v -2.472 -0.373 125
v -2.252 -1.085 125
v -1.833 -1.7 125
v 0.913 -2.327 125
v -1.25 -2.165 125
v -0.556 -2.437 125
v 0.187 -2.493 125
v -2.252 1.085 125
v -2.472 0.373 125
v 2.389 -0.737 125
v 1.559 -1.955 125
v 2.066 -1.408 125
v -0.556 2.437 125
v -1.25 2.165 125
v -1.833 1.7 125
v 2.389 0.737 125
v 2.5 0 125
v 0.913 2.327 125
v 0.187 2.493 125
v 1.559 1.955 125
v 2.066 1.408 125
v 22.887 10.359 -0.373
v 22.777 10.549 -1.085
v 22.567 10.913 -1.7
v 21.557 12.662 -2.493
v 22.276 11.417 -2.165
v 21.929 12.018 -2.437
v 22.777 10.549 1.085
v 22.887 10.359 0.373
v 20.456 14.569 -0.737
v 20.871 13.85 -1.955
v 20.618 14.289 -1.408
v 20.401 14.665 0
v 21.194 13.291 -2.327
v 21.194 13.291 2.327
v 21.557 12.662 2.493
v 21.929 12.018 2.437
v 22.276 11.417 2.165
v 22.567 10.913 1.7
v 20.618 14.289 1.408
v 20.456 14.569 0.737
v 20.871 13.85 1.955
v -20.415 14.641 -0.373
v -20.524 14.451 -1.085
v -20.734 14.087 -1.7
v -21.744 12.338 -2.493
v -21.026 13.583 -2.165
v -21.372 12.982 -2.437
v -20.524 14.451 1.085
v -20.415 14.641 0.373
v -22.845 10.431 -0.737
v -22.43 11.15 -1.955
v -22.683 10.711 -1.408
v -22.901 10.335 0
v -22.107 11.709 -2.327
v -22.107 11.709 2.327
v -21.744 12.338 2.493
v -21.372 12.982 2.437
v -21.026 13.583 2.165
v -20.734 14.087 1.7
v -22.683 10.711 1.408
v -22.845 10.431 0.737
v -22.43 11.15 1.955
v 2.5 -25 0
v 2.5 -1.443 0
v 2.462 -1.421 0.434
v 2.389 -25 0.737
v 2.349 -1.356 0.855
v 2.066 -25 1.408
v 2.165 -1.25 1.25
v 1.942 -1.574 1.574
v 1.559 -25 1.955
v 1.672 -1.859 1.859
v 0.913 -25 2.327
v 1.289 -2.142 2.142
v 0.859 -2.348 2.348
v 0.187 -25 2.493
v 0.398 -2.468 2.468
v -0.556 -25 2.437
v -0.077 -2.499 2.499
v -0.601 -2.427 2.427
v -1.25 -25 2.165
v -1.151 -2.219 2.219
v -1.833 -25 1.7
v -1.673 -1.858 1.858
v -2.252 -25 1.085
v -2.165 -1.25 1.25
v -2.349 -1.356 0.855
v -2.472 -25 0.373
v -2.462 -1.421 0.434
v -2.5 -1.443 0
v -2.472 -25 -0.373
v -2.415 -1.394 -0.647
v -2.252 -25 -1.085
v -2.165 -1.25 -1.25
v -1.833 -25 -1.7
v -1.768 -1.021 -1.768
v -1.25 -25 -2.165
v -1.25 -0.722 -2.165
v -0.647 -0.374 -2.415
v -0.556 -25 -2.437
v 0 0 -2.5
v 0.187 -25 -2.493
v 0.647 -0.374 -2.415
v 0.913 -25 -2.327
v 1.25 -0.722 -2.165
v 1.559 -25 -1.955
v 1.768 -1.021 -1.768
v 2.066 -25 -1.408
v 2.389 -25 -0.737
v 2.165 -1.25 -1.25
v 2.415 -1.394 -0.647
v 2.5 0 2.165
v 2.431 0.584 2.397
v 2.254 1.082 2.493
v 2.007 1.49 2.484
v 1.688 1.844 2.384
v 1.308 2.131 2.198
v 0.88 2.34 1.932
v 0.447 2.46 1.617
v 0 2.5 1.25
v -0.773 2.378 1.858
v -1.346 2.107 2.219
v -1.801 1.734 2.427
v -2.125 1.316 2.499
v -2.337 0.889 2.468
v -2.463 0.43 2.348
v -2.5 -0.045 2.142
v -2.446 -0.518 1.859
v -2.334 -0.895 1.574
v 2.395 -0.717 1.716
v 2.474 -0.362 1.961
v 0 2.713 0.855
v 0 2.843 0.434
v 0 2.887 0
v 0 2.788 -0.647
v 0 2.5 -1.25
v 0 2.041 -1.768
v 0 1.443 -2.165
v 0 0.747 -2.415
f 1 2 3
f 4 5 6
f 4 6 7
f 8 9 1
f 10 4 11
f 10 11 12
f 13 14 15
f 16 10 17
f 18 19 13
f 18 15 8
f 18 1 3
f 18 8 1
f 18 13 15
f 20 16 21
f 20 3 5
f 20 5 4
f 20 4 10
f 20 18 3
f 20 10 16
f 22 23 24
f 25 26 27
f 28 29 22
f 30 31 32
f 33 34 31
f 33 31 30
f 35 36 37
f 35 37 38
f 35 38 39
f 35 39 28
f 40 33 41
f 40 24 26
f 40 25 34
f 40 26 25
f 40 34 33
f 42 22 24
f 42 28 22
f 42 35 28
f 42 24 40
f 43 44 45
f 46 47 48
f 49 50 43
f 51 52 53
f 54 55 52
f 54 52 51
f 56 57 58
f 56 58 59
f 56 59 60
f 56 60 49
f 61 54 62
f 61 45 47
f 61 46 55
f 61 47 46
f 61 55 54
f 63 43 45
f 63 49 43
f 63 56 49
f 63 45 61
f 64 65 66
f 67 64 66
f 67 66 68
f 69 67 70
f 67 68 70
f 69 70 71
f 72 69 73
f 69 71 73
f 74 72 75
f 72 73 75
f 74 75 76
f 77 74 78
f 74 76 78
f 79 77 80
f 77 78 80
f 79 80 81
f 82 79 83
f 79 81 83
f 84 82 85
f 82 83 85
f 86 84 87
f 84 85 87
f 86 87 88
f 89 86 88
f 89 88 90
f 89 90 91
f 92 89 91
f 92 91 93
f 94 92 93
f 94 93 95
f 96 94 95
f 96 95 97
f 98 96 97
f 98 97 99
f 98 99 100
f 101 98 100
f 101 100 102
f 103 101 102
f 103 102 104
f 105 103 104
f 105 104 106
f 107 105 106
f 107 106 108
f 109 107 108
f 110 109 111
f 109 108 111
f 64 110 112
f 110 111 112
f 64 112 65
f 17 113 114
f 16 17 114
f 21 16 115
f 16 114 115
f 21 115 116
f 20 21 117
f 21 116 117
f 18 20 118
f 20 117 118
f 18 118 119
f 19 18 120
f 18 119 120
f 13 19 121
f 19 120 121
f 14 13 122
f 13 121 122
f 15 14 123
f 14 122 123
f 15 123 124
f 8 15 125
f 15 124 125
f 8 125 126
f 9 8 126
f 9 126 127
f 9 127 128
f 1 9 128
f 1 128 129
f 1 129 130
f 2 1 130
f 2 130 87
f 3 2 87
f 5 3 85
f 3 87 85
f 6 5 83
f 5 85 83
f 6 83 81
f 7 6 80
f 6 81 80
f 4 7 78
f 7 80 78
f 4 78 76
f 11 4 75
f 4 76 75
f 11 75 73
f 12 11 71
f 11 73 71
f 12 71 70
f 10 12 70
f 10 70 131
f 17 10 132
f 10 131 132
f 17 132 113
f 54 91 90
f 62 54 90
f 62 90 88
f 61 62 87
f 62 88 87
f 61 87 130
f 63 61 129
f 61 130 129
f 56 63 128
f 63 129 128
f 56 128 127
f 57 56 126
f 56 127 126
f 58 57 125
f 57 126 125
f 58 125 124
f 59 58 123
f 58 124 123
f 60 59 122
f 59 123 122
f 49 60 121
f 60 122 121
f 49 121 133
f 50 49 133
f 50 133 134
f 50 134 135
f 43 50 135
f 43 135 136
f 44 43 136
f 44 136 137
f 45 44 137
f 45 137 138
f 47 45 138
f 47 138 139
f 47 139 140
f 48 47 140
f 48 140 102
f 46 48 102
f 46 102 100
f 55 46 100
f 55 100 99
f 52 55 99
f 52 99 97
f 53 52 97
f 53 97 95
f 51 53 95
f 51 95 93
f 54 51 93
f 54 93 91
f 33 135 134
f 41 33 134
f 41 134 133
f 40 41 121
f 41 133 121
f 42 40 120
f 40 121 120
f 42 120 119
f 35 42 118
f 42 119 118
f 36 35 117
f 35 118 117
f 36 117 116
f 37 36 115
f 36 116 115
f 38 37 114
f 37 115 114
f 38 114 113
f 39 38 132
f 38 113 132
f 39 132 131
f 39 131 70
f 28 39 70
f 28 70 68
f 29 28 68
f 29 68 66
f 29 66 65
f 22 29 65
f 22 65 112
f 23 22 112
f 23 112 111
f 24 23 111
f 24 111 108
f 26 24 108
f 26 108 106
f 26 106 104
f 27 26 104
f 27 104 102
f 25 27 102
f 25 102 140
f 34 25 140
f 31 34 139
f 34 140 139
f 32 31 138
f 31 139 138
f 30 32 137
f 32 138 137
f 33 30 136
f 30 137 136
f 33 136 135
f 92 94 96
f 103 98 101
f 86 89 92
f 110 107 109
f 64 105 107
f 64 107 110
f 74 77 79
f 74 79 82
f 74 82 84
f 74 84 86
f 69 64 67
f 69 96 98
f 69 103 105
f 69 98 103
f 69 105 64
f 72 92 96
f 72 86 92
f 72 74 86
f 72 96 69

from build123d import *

# Parameters (mm, degrees)
F0_R     = 2.5
F1_DEPTH = 25
F3_COUNT = 3
F2_R     = 2.5
F4_DEPTH = 125


with BuildPart() as f1:
    # F0 (on Front) → F1 (new body)
    with BuildSketch(Plane.XZ):
        Circle(F0_R)
    extrude(amount=F1_DEPTH)


with BuildPart() as f3_1:
    # F3: instance of F1
    add(f1.part.rotate(Axis((0, 0, 0), (0, 0, 1)), 1 * 360 / F3_COUNT))


with BuildPart() as f3_2:
    # F3: instance of F1
    add(f1.part.rotate(Axis((0, 0, 0), (0, 0, 1)), 2 * 360 / F3_COUNT))


with BuildPart() as f1_1:
    add(f1.part)

    add(f3_1.part)  # F4 merges F3_1

    add(f3_2.part)  # F4 merges F3_2
    # F2 (on Top) → F4 (join)
    with BuildSketch(Plane.XY):
        Circle(F2_R)
    extrude(amount=F4_DEPTH)


solid = f1_1.part
